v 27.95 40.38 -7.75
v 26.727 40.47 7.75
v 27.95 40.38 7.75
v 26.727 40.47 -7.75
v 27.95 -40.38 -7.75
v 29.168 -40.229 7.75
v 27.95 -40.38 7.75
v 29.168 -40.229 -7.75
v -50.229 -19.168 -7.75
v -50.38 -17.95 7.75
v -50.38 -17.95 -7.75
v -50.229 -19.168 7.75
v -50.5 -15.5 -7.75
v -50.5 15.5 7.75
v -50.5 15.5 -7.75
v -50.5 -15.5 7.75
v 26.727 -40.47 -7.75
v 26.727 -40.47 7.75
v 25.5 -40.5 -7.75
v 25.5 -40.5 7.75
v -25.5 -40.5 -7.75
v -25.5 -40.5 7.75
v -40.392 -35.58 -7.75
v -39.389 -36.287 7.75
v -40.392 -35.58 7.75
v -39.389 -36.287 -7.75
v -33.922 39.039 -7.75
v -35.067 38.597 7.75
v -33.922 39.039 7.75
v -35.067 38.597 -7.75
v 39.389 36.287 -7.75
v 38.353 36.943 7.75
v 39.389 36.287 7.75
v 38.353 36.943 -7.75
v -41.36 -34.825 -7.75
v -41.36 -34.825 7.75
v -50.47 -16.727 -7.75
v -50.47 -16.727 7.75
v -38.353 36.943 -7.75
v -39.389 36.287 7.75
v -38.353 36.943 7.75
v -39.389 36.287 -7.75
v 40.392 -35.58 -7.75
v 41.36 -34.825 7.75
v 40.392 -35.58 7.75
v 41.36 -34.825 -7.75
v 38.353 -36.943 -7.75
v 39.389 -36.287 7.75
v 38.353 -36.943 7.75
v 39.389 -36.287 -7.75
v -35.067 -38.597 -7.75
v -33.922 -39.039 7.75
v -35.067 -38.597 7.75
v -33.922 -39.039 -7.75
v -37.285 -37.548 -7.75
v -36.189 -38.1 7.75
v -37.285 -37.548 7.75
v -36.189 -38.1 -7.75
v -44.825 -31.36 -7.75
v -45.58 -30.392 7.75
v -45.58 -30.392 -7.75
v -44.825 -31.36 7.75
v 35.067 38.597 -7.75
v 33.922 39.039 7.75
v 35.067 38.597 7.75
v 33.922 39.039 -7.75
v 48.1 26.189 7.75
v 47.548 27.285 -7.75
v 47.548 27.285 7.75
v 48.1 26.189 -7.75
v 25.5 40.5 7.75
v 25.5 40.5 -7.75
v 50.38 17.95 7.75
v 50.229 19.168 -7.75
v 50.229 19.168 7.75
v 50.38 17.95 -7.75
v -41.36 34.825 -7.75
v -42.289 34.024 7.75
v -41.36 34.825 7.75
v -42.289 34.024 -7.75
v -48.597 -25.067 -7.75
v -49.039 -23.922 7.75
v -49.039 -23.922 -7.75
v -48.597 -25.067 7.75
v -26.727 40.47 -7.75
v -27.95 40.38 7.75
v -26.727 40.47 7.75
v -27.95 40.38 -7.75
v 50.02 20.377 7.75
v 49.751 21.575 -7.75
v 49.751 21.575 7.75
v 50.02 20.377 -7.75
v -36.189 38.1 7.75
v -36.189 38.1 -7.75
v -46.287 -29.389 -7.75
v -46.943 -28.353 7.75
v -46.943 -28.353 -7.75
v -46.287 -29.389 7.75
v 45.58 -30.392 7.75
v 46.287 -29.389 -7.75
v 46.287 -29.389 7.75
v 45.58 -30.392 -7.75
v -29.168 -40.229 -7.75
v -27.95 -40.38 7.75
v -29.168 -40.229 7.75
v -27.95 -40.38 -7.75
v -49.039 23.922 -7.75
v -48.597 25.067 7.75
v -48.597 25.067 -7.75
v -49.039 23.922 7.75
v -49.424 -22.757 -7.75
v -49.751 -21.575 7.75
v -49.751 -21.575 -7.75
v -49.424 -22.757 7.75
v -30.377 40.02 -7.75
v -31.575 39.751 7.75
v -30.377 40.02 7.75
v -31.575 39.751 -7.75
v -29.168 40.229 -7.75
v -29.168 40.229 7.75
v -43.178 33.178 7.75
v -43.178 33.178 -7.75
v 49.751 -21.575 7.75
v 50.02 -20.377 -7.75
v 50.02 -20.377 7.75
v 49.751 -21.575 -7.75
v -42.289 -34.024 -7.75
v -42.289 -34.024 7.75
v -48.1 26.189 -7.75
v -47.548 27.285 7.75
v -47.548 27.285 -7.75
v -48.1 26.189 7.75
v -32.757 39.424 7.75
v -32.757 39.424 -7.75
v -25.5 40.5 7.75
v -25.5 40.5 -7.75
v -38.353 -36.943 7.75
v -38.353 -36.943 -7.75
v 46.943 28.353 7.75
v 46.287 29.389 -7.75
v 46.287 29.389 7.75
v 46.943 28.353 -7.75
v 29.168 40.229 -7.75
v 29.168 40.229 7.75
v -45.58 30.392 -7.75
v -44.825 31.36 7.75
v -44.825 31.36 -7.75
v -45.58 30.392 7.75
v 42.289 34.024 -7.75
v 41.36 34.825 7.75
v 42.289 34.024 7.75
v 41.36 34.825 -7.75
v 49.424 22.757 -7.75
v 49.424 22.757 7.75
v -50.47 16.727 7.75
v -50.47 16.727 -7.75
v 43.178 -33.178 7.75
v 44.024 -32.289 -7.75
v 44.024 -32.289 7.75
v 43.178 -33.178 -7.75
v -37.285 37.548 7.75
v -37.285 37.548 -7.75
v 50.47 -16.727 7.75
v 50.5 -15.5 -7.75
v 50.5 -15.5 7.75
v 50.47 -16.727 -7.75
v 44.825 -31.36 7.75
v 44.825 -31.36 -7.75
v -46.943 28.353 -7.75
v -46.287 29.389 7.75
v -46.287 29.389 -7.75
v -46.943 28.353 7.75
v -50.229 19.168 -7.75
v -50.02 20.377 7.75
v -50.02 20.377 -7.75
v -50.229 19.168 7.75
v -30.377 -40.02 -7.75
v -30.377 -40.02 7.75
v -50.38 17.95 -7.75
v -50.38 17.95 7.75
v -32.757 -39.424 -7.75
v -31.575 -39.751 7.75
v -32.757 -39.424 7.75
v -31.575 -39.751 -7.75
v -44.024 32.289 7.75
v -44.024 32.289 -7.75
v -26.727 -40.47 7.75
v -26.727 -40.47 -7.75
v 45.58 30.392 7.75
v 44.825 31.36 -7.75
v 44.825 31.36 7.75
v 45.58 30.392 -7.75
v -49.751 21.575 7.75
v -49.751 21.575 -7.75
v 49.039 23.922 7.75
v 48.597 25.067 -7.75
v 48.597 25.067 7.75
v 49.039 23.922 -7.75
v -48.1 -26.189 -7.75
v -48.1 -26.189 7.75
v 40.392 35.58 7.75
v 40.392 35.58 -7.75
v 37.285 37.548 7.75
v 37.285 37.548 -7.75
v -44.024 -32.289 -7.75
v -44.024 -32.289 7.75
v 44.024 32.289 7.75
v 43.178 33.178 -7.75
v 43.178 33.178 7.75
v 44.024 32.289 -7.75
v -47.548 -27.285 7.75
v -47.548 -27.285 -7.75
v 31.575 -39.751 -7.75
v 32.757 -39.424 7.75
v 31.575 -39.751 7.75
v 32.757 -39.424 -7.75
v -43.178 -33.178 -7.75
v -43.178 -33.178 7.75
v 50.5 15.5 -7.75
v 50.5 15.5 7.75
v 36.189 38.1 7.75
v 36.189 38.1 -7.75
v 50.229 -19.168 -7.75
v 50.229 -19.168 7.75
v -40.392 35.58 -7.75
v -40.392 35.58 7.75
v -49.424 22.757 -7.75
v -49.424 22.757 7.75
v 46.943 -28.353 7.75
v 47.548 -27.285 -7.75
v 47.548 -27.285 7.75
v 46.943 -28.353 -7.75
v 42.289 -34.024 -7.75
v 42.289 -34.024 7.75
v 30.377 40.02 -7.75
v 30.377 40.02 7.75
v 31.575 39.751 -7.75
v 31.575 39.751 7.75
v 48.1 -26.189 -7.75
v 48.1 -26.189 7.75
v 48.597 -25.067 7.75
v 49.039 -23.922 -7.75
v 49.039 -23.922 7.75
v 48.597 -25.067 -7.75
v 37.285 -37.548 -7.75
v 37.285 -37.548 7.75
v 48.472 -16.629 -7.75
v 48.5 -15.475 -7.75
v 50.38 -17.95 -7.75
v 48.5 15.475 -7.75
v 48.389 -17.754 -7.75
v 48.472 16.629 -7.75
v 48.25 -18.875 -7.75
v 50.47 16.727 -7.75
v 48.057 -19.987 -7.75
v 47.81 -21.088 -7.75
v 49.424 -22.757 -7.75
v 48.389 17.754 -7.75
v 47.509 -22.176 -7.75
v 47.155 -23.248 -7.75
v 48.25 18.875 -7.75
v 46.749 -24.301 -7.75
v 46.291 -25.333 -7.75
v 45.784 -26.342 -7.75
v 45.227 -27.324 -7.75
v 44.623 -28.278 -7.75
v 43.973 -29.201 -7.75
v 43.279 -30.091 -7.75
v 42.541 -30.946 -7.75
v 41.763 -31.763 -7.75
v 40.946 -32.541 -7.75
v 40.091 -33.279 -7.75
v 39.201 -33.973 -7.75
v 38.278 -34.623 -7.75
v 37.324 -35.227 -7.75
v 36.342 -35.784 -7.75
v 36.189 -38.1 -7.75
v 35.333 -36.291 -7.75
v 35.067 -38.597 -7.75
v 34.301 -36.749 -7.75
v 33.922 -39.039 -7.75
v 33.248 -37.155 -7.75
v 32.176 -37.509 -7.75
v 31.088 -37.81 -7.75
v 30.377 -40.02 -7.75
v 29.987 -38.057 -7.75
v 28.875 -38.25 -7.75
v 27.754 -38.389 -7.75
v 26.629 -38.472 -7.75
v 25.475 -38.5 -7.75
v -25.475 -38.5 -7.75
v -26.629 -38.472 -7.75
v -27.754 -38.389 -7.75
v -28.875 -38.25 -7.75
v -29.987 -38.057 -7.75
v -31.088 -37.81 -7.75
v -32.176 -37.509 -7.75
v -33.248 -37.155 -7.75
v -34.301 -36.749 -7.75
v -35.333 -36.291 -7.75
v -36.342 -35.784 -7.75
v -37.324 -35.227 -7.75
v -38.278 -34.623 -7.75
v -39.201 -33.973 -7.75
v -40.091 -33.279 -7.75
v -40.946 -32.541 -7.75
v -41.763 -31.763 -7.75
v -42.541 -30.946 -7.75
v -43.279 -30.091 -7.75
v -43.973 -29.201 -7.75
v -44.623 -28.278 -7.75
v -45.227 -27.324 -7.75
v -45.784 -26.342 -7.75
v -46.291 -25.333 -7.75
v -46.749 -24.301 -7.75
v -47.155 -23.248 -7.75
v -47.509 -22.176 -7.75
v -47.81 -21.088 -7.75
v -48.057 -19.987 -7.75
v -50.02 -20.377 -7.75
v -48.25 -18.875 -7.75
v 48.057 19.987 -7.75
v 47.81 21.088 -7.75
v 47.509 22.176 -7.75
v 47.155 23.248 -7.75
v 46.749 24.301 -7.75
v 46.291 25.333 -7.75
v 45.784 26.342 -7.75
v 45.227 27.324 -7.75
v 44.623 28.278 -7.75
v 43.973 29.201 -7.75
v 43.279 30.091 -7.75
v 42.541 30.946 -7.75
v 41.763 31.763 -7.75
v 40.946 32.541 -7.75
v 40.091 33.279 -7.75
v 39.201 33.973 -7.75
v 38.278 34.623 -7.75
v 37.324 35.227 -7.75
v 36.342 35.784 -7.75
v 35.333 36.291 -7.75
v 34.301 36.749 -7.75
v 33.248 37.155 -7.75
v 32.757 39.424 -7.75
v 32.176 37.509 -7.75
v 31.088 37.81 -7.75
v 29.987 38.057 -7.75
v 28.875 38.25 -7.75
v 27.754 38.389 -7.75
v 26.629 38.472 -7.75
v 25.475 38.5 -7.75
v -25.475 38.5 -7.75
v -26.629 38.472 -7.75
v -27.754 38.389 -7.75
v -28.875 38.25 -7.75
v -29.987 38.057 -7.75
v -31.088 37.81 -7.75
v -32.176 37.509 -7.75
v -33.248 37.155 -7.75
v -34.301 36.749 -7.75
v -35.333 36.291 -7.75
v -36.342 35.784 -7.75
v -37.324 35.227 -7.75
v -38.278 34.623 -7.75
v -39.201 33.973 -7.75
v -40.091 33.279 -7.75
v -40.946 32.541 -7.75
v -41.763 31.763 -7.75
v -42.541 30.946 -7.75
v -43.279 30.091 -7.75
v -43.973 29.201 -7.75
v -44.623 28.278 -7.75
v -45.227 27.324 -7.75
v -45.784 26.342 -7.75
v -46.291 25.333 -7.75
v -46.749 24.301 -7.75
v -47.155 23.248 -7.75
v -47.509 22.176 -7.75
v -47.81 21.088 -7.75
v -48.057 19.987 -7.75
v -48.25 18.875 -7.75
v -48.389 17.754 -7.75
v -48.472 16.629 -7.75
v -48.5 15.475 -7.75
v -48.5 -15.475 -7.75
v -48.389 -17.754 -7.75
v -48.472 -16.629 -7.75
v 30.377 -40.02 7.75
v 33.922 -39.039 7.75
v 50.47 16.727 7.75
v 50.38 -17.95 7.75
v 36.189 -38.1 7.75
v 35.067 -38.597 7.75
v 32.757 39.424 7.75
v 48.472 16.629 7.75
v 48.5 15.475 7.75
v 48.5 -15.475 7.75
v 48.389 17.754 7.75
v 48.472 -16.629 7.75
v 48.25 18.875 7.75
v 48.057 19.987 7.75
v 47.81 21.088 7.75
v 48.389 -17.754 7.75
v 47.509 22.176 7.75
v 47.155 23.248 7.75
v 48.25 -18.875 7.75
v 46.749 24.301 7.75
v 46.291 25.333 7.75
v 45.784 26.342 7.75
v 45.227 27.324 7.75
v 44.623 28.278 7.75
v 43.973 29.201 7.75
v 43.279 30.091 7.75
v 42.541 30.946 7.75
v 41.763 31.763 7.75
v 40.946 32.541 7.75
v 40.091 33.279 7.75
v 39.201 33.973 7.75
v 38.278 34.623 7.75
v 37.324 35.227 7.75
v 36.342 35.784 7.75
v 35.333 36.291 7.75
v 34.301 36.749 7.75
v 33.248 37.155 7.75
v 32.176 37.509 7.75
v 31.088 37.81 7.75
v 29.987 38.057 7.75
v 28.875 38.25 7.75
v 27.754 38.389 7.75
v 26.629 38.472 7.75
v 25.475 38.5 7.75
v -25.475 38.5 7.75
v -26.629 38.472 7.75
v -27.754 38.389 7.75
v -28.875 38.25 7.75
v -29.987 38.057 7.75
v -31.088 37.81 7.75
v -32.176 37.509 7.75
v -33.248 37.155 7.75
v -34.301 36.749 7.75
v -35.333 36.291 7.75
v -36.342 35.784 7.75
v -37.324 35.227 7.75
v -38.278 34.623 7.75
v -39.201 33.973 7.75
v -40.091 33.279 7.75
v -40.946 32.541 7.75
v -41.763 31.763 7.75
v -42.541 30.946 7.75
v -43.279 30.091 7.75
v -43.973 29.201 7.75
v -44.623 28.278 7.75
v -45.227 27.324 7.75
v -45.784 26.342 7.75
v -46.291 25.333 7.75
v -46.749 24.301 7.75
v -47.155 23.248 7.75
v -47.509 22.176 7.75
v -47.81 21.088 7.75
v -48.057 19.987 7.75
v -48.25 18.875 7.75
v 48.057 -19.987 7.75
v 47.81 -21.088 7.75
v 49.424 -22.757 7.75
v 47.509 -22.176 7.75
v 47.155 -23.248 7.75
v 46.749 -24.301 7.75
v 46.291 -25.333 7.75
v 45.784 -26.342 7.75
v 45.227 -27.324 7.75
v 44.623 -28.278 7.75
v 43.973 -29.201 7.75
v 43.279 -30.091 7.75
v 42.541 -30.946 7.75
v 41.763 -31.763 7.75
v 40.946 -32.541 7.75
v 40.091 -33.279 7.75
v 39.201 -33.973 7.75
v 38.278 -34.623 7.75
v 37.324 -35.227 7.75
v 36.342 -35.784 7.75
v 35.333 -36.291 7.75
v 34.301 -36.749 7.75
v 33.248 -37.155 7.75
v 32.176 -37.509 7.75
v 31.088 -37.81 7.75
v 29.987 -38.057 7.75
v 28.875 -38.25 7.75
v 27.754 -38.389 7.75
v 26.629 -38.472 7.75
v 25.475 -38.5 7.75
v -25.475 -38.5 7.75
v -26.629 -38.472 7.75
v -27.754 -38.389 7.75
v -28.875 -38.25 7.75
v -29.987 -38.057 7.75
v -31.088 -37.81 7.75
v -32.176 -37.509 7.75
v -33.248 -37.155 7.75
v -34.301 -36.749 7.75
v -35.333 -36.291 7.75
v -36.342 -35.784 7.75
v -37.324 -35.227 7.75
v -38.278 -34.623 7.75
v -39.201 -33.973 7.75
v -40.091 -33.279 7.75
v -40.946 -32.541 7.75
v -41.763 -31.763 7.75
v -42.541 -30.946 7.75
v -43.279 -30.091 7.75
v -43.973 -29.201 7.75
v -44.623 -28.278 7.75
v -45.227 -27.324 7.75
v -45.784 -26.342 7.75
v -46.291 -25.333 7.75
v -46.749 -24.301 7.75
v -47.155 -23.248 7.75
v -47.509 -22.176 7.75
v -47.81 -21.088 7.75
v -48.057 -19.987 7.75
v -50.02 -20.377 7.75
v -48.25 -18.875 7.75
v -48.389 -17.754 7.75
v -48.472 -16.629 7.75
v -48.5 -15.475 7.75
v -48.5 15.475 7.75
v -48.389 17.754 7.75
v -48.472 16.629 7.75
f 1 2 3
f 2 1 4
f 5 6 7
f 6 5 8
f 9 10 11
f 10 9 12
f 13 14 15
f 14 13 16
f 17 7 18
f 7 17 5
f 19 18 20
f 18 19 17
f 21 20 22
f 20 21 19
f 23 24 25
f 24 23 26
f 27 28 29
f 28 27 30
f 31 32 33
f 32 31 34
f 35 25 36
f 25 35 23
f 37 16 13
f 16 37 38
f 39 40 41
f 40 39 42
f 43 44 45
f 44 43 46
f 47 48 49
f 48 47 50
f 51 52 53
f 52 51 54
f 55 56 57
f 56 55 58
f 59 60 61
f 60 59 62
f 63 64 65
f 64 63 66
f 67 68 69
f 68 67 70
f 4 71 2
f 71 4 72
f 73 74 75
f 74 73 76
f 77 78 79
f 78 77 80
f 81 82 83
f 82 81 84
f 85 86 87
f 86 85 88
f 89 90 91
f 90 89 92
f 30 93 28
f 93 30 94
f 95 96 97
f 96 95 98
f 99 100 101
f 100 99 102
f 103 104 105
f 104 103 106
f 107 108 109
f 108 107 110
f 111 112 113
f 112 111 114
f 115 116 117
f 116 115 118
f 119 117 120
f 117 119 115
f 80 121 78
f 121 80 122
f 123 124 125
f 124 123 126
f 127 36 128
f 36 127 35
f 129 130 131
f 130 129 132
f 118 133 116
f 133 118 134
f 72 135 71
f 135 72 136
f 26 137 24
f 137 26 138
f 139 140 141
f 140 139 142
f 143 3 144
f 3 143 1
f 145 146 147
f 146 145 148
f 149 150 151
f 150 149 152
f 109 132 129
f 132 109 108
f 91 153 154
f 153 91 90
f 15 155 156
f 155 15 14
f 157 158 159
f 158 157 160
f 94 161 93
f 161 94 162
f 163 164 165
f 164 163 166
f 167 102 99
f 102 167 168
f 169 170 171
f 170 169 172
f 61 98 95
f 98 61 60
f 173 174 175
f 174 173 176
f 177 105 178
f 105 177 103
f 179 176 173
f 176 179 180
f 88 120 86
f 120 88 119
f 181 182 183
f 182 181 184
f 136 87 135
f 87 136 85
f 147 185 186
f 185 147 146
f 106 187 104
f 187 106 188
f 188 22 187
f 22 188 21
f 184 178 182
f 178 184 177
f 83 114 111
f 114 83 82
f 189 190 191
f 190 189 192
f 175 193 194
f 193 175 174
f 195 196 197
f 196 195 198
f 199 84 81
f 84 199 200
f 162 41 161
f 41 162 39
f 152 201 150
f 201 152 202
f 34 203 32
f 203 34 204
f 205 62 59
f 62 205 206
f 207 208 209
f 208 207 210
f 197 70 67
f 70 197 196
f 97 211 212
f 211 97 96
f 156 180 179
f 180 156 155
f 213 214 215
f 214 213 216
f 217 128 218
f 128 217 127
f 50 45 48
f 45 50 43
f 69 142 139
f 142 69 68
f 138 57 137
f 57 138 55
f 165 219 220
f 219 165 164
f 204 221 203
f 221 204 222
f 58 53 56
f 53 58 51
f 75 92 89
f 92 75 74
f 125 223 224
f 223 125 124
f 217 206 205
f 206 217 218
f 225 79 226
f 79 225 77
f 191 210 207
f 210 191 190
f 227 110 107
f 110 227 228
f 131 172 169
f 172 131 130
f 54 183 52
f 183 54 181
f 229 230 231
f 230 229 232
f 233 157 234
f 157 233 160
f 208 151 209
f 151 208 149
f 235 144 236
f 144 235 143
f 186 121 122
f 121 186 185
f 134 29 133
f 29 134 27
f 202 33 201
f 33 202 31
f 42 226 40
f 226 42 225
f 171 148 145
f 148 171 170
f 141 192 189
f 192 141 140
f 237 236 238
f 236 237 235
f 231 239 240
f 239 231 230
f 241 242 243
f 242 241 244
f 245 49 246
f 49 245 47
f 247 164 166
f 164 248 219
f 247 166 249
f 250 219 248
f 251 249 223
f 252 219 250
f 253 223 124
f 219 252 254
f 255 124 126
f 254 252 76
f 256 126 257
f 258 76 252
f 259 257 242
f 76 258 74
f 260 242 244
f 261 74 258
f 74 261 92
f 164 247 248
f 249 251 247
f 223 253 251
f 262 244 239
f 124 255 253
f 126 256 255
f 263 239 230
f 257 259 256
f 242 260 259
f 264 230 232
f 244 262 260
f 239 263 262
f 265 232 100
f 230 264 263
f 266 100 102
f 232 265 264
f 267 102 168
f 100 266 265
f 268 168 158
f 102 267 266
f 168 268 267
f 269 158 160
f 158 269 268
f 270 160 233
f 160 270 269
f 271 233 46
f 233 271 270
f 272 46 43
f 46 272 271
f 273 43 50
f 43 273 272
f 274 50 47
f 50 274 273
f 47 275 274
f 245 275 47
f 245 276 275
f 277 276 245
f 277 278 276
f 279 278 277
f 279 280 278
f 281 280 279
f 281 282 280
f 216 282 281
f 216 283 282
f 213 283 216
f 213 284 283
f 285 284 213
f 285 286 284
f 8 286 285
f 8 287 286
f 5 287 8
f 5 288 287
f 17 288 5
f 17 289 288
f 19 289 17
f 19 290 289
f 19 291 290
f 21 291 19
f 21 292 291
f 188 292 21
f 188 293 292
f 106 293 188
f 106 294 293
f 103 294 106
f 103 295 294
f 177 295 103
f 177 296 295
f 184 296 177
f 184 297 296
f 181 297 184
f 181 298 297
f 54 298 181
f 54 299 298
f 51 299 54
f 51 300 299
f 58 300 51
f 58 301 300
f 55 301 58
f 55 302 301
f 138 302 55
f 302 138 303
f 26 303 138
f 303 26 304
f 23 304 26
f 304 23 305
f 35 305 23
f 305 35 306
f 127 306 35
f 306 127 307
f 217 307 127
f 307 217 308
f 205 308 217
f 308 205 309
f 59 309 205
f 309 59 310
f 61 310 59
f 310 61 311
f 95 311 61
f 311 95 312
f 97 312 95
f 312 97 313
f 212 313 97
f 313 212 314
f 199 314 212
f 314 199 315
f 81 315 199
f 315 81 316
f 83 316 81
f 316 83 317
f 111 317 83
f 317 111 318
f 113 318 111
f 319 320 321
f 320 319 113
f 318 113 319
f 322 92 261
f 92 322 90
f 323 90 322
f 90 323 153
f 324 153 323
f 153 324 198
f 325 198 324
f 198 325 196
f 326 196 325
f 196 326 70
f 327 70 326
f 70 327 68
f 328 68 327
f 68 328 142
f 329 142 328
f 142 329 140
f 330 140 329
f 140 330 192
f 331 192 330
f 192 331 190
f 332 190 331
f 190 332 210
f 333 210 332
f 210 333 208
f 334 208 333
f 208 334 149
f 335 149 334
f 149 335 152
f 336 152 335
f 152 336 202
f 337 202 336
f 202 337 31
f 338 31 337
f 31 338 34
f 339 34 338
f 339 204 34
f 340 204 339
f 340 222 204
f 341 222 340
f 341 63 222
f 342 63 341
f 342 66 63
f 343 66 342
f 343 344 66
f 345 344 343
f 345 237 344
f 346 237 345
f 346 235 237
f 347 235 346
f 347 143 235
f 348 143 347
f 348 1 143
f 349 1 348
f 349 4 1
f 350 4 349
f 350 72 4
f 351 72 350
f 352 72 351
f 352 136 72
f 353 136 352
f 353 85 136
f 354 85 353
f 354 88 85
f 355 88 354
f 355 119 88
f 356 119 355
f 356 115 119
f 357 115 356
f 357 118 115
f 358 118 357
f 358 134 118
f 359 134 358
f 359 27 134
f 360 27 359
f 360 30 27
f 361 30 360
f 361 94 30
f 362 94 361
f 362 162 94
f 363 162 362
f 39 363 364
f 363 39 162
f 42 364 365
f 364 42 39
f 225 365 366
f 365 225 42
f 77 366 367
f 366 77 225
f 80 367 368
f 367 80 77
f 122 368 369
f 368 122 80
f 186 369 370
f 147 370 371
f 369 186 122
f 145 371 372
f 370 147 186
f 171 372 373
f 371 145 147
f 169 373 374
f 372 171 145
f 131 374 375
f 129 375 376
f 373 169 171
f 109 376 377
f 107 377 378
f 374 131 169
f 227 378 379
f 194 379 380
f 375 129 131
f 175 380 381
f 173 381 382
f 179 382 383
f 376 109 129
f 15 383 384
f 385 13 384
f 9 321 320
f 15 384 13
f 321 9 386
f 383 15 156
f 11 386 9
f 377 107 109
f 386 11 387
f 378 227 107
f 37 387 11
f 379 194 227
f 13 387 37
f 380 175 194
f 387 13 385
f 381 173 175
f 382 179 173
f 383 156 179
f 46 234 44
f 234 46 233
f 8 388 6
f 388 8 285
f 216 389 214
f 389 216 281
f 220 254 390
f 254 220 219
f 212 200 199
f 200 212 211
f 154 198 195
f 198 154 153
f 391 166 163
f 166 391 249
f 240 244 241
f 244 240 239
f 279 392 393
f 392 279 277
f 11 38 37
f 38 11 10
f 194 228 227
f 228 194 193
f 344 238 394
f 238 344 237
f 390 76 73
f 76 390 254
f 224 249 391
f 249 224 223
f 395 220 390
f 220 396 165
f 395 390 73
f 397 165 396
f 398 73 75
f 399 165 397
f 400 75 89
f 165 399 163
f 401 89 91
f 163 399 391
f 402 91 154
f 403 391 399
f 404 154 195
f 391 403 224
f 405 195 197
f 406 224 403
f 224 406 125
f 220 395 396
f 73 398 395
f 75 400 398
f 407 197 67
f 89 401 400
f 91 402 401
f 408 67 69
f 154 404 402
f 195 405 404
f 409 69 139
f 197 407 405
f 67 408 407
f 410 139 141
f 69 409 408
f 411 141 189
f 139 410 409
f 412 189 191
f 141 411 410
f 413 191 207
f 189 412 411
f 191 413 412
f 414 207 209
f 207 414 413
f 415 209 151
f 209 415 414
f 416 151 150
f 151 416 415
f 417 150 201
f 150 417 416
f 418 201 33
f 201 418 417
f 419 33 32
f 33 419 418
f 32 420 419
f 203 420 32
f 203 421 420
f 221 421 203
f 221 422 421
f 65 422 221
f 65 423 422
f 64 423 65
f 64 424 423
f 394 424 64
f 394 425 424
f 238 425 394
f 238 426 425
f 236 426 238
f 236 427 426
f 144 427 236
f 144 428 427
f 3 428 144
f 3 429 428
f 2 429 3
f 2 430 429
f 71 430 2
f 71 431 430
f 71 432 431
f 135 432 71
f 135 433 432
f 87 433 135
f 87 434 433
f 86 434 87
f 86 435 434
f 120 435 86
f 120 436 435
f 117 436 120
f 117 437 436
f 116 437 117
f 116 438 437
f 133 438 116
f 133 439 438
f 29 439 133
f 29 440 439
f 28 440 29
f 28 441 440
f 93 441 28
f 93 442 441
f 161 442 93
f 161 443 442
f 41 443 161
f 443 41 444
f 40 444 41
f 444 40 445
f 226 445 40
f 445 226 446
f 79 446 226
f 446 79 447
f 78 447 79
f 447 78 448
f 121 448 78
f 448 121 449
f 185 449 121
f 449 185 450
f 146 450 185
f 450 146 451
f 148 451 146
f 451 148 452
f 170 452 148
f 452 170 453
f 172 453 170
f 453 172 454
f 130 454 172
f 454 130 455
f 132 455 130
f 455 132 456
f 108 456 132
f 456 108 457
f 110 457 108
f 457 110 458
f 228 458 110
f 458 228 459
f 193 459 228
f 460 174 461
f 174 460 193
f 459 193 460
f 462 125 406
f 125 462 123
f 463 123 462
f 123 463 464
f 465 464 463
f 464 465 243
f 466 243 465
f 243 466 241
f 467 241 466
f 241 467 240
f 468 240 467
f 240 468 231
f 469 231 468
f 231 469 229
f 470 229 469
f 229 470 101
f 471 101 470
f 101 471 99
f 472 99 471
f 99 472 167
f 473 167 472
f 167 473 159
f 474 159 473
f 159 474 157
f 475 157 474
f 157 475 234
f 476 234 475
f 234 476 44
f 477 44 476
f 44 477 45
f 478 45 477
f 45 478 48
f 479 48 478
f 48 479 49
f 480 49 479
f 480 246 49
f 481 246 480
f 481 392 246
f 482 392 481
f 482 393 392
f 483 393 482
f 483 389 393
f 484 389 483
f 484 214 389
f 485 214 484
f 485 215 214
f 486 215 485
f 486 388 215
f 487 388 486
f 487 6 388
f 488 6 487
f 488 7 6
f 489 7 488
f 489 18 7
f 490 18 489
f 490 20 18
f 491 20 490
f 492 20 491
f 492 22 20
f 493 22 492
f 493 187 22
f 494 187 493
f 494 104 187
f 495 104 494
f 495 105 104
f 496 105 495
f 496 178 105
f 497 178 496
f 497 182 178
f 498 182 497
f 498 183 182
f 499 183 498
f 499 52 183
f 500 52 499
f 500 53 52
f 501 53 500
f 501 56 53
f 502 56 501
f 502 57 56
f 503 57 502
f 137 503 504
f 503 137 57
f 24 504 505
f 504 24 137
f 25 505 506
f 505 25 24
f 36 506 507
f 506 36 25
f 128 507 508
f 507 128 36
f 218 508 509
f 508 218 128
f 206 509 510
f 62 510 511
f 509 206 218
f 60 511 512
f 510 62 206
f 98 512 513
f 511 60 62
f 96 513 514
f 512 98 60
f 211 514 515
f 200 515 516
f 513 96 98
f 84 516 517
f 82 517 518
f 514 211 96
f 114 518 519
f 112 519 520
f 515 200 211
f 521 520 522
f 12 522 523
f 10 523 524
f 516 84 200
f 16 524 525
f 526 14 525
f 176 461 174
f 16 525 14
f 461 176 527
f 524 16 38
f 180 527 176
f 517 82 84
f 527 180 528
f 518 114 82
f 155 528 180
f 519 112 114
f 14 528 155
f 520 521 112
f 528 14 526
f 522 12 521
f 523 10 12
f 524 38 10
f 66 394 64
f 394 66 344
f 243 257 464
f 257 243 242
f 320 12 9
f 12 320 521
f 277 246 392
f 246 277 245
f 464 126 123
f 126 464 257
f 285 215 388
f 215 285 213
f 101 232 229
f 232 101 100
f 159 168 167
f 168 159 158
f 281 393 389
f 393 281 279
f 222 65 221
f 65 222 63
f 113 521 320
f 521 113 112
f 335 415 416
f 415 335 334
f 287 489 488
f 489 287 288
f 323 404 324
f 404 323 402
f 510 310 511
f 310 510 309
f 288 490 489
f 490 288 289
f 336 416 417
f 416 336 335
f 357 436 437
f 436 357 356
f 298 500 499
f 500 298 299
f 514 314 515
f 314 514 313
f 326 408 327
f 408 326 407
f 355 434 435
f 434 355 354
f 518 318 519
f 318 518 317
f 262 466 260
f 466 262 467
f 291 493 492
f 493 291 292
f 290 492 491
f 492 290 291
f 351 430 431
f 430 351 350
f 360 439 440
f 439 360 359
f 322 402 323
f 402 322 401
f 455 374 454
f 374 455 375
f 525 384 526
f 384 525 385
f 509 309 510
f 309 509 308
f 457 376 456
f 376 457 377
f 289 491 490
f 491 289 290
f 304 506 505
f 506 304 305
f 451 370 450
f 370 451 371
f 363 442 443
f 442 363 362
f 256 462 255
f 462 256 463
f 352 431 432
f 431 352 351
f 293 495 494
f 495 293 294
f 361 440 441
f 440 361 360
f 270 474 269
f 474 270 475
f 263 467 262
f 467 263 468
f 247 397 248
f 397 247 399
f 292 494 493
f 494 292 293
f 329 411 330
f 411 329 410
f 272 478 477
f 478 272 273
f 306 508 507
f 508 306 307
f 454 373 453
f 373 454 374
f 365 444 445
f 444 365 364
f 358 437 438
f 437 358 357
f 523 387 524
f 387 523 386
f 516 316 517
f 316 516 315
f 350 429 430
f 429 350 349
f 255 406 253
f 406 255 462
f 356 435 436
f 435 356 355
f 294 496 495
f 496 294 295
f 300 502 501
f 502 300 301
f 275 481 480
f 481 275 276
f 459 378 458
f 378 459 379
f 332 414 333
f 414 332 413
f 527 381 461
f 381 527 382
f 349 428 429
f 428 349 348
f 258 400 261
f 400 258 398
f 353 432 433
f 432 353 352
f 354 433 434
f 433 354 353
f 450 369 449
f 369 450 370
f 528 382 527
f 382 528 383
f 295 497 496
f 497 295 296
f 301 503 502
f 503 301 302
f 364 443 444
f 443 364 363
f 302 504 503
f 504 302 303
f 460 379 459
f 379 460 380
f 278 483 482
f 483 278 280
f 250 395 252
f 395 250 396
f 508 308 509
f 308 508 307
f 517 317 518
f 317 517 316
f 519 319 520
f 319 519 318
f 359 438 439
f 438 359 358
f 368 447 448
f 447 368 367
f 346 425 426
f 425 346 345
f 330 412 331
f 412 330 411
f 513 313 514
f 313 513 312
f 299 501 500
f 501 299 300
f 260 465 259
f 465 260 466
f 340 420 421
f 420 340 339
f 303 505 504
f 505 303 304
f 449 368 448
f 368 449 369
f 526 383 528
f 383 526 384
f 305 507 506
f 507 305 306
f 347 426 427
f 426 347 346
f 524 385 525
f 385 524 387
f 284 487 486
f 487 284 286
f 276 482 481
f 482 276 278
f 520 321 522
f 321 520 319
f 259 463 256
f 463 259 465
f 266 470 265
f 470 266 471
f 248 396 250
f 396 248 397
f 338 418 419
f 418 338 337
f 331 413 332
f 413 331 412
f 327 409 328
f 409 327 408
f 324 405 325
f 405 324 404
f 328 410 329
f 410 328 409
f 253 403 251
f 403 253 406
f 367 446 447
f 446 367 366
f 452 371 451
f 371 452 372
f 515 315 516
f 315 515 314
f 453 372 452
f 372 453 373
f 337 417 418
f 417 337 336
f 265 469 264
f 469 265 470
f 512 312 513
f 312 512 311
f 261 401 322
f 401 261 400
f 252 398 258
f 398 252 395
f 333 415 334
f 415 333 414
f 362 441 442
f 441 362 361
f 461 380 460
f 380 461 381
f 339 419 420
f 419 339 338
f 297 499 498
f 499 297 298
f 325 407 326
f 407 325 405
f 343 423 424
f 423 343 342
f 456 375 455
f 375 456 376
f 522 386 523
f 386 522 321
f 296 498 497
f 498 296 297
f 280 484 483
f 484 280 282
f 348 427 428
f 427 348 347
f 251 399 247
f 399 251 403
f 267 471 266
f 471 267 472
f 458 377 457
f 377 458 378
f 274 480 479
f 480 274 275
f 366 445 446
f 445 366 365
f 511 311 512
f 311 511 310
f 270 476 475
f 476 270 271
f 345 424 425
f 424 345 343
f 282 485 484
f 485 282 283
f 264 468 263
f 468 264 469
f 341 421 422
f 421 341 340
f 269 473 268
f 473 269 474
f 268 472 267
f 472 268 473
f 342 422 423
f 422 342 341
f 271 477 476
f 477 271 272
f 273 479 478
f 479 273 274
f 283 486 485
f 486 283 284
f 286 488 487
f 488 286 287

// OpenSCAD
// ============================================================
// 奥克斯(AUX)饮水机杯垫 —— 环形版 (独立文件, 实心版见 饮水机杯垫.scad)
// 外尺寸: 101 x 81 x 15.5 mm (与实心版一致, 保持不变)
// 竖边圆角 R = 25, 壁厚 WALL = 2 mm (内腔自动带 R = 23 圆角)
// 顶/底棱边 45° 倒角, 默认 0.5mm
//   注意: 环形时倒角须 < 壁厚的一半 (1mm) 才能保留平顶;
//         WALL = 0 退回实心; CHAMFER = 0 取消倒角
// ============================================================

$fn = 128;

W = 101;        // 长 (X)
D = 81;         // 宽 (Y)
H = 15.5;       // 高 (Z)
R = 25;         // 竖边圆角半径

WALL = 2;       // 壁厚 (0 = 实心)
CHAMFER = 0;  // 顶/底棱边倒角尺寸 (0 = 不倒角)
E = 0.02;       // 微小过切, 避免共面

// ------------------------------------------------------------
// 带圆角的矩形截面
// ------------------------------------------------------------
module rounded_rect_profile(size_w, size_d, radius) {
    offset(r = radius) offset(r = -radius)
        square([size_w, size_d], center = true);
}

module profile_outer() { rounded_rect_profile(W, D, R); }
module profile_inner() { offset(r = -WALL) profile_outer(); }

// ------------------------------------------------------------
// 主体: 外轮廓拉伸, 减去内腔
// ------------------------------------------------------------
module body() {
    if (WALL <= 0) {
        linear_extrude(height = H, center = true) profile_outer();
    } else {
        difference() {
            linear_extrude(height = H, center = true) profile_outer();
            linear_extrude(height = H + 2*E, center = true) profile_inner();
        }
    }
}

// ------------------------------------------------------------
// 外沿 45° 倒角楔块 (axis: "X"/"Y" 截面所在侧面; sign: ±1; top: 顶/底)
// 斜边严格通过 (i, 顶面) 与 (f, 顶面-CHAMFER), 保证 45°
// ------------------------------------------------------------
module wedge(axis, sign, top) {
    if (axis == "Y") {
        f = sign * D/2;                          // 外沿面位置
        i = f - sign * CHAMFER;                  // 顶面内缩点
        rotate([0, 90, 0])                       // 截面在 YZ 平面, 沿 X 拉伸
            linear_extrude(W + 4 * CHAMFER, center = true)
                polygon(top ? [
                    [-H/2,           i],
                    [-H/2 + CHAMFER, f],
                    [-H/2 - E,       f],
                    [-H/2 - E,       i]
                ] : [
                    [ H/2,           i],
                    [ H/2 - CHAMFER, f],
                    [ H/2 + E,       f],
                    [ H/2 + E,       i]
                ]);
    } else {
        f = sign * W/2;
        i = f - sign * CHAMFER;
        rotate([90, 0, 0])                       // 截面在 XZ 平面, 沿 Y 拉伸
            linear_extrude(D + 4 * CHAMFER, center = true)
                polygon(top ? [
                    [i,  H/2],
                    [f,  H/2 - CHAMFER],
                    [f,  H/2 + E],
                    [i,  H/2 + E]
                ] : [
                    [i, -H/2],
                    [f, -H/2 + CHAMFER],
                    [f, -H/2 - E],
                    [i, -H/2 - E]
                ]);
    }
}

// ------------------------------------------------------------
// 内腔 45° 倒角切块(棱锥台): 从内轮廓(z=zMid) 到扩大 CHAMFER 的
// 轮廓(z=zExt)。横截面随高度线性过渡, 自动跟随四角圆弧,
// 不会在角部留下台阶。
// ------------------------------------------------------------
module plug(top) {
    s = top ? 1 : -1;
    zMid = s*(H/2) - s*CHAMFER;
    zExt = s*(H/2) + s*E;
    hull() {
        translate([0, 0, zMid])
            linear_extrude(0.001, center = true) profile_inner();
        translate([0, 0, zExt])
            linear_extrude(0.001, center = true) offset(r = CHAMFER) profile_inner();
    }
}

// ------------------------------------------------------------
// 成品
// ------------------------------------------------------------
module coaster() {
    if (CHAMFER <= 0) {
        body();
    } else {
        difference() {
            body();
            // 外沿: 四边 x 顶/底
            for (s = [1, -1]) {
                for (top = [true, false]) {
                    wedge("Y", s, top);
                    wedge("X", s, top);
                }
            }
            // 内腔: 顶/底各一个棱锥台
            if (WALL > 0) {
                plug(true);
                plug(false);
            }
        }
    }
}

coaster();
